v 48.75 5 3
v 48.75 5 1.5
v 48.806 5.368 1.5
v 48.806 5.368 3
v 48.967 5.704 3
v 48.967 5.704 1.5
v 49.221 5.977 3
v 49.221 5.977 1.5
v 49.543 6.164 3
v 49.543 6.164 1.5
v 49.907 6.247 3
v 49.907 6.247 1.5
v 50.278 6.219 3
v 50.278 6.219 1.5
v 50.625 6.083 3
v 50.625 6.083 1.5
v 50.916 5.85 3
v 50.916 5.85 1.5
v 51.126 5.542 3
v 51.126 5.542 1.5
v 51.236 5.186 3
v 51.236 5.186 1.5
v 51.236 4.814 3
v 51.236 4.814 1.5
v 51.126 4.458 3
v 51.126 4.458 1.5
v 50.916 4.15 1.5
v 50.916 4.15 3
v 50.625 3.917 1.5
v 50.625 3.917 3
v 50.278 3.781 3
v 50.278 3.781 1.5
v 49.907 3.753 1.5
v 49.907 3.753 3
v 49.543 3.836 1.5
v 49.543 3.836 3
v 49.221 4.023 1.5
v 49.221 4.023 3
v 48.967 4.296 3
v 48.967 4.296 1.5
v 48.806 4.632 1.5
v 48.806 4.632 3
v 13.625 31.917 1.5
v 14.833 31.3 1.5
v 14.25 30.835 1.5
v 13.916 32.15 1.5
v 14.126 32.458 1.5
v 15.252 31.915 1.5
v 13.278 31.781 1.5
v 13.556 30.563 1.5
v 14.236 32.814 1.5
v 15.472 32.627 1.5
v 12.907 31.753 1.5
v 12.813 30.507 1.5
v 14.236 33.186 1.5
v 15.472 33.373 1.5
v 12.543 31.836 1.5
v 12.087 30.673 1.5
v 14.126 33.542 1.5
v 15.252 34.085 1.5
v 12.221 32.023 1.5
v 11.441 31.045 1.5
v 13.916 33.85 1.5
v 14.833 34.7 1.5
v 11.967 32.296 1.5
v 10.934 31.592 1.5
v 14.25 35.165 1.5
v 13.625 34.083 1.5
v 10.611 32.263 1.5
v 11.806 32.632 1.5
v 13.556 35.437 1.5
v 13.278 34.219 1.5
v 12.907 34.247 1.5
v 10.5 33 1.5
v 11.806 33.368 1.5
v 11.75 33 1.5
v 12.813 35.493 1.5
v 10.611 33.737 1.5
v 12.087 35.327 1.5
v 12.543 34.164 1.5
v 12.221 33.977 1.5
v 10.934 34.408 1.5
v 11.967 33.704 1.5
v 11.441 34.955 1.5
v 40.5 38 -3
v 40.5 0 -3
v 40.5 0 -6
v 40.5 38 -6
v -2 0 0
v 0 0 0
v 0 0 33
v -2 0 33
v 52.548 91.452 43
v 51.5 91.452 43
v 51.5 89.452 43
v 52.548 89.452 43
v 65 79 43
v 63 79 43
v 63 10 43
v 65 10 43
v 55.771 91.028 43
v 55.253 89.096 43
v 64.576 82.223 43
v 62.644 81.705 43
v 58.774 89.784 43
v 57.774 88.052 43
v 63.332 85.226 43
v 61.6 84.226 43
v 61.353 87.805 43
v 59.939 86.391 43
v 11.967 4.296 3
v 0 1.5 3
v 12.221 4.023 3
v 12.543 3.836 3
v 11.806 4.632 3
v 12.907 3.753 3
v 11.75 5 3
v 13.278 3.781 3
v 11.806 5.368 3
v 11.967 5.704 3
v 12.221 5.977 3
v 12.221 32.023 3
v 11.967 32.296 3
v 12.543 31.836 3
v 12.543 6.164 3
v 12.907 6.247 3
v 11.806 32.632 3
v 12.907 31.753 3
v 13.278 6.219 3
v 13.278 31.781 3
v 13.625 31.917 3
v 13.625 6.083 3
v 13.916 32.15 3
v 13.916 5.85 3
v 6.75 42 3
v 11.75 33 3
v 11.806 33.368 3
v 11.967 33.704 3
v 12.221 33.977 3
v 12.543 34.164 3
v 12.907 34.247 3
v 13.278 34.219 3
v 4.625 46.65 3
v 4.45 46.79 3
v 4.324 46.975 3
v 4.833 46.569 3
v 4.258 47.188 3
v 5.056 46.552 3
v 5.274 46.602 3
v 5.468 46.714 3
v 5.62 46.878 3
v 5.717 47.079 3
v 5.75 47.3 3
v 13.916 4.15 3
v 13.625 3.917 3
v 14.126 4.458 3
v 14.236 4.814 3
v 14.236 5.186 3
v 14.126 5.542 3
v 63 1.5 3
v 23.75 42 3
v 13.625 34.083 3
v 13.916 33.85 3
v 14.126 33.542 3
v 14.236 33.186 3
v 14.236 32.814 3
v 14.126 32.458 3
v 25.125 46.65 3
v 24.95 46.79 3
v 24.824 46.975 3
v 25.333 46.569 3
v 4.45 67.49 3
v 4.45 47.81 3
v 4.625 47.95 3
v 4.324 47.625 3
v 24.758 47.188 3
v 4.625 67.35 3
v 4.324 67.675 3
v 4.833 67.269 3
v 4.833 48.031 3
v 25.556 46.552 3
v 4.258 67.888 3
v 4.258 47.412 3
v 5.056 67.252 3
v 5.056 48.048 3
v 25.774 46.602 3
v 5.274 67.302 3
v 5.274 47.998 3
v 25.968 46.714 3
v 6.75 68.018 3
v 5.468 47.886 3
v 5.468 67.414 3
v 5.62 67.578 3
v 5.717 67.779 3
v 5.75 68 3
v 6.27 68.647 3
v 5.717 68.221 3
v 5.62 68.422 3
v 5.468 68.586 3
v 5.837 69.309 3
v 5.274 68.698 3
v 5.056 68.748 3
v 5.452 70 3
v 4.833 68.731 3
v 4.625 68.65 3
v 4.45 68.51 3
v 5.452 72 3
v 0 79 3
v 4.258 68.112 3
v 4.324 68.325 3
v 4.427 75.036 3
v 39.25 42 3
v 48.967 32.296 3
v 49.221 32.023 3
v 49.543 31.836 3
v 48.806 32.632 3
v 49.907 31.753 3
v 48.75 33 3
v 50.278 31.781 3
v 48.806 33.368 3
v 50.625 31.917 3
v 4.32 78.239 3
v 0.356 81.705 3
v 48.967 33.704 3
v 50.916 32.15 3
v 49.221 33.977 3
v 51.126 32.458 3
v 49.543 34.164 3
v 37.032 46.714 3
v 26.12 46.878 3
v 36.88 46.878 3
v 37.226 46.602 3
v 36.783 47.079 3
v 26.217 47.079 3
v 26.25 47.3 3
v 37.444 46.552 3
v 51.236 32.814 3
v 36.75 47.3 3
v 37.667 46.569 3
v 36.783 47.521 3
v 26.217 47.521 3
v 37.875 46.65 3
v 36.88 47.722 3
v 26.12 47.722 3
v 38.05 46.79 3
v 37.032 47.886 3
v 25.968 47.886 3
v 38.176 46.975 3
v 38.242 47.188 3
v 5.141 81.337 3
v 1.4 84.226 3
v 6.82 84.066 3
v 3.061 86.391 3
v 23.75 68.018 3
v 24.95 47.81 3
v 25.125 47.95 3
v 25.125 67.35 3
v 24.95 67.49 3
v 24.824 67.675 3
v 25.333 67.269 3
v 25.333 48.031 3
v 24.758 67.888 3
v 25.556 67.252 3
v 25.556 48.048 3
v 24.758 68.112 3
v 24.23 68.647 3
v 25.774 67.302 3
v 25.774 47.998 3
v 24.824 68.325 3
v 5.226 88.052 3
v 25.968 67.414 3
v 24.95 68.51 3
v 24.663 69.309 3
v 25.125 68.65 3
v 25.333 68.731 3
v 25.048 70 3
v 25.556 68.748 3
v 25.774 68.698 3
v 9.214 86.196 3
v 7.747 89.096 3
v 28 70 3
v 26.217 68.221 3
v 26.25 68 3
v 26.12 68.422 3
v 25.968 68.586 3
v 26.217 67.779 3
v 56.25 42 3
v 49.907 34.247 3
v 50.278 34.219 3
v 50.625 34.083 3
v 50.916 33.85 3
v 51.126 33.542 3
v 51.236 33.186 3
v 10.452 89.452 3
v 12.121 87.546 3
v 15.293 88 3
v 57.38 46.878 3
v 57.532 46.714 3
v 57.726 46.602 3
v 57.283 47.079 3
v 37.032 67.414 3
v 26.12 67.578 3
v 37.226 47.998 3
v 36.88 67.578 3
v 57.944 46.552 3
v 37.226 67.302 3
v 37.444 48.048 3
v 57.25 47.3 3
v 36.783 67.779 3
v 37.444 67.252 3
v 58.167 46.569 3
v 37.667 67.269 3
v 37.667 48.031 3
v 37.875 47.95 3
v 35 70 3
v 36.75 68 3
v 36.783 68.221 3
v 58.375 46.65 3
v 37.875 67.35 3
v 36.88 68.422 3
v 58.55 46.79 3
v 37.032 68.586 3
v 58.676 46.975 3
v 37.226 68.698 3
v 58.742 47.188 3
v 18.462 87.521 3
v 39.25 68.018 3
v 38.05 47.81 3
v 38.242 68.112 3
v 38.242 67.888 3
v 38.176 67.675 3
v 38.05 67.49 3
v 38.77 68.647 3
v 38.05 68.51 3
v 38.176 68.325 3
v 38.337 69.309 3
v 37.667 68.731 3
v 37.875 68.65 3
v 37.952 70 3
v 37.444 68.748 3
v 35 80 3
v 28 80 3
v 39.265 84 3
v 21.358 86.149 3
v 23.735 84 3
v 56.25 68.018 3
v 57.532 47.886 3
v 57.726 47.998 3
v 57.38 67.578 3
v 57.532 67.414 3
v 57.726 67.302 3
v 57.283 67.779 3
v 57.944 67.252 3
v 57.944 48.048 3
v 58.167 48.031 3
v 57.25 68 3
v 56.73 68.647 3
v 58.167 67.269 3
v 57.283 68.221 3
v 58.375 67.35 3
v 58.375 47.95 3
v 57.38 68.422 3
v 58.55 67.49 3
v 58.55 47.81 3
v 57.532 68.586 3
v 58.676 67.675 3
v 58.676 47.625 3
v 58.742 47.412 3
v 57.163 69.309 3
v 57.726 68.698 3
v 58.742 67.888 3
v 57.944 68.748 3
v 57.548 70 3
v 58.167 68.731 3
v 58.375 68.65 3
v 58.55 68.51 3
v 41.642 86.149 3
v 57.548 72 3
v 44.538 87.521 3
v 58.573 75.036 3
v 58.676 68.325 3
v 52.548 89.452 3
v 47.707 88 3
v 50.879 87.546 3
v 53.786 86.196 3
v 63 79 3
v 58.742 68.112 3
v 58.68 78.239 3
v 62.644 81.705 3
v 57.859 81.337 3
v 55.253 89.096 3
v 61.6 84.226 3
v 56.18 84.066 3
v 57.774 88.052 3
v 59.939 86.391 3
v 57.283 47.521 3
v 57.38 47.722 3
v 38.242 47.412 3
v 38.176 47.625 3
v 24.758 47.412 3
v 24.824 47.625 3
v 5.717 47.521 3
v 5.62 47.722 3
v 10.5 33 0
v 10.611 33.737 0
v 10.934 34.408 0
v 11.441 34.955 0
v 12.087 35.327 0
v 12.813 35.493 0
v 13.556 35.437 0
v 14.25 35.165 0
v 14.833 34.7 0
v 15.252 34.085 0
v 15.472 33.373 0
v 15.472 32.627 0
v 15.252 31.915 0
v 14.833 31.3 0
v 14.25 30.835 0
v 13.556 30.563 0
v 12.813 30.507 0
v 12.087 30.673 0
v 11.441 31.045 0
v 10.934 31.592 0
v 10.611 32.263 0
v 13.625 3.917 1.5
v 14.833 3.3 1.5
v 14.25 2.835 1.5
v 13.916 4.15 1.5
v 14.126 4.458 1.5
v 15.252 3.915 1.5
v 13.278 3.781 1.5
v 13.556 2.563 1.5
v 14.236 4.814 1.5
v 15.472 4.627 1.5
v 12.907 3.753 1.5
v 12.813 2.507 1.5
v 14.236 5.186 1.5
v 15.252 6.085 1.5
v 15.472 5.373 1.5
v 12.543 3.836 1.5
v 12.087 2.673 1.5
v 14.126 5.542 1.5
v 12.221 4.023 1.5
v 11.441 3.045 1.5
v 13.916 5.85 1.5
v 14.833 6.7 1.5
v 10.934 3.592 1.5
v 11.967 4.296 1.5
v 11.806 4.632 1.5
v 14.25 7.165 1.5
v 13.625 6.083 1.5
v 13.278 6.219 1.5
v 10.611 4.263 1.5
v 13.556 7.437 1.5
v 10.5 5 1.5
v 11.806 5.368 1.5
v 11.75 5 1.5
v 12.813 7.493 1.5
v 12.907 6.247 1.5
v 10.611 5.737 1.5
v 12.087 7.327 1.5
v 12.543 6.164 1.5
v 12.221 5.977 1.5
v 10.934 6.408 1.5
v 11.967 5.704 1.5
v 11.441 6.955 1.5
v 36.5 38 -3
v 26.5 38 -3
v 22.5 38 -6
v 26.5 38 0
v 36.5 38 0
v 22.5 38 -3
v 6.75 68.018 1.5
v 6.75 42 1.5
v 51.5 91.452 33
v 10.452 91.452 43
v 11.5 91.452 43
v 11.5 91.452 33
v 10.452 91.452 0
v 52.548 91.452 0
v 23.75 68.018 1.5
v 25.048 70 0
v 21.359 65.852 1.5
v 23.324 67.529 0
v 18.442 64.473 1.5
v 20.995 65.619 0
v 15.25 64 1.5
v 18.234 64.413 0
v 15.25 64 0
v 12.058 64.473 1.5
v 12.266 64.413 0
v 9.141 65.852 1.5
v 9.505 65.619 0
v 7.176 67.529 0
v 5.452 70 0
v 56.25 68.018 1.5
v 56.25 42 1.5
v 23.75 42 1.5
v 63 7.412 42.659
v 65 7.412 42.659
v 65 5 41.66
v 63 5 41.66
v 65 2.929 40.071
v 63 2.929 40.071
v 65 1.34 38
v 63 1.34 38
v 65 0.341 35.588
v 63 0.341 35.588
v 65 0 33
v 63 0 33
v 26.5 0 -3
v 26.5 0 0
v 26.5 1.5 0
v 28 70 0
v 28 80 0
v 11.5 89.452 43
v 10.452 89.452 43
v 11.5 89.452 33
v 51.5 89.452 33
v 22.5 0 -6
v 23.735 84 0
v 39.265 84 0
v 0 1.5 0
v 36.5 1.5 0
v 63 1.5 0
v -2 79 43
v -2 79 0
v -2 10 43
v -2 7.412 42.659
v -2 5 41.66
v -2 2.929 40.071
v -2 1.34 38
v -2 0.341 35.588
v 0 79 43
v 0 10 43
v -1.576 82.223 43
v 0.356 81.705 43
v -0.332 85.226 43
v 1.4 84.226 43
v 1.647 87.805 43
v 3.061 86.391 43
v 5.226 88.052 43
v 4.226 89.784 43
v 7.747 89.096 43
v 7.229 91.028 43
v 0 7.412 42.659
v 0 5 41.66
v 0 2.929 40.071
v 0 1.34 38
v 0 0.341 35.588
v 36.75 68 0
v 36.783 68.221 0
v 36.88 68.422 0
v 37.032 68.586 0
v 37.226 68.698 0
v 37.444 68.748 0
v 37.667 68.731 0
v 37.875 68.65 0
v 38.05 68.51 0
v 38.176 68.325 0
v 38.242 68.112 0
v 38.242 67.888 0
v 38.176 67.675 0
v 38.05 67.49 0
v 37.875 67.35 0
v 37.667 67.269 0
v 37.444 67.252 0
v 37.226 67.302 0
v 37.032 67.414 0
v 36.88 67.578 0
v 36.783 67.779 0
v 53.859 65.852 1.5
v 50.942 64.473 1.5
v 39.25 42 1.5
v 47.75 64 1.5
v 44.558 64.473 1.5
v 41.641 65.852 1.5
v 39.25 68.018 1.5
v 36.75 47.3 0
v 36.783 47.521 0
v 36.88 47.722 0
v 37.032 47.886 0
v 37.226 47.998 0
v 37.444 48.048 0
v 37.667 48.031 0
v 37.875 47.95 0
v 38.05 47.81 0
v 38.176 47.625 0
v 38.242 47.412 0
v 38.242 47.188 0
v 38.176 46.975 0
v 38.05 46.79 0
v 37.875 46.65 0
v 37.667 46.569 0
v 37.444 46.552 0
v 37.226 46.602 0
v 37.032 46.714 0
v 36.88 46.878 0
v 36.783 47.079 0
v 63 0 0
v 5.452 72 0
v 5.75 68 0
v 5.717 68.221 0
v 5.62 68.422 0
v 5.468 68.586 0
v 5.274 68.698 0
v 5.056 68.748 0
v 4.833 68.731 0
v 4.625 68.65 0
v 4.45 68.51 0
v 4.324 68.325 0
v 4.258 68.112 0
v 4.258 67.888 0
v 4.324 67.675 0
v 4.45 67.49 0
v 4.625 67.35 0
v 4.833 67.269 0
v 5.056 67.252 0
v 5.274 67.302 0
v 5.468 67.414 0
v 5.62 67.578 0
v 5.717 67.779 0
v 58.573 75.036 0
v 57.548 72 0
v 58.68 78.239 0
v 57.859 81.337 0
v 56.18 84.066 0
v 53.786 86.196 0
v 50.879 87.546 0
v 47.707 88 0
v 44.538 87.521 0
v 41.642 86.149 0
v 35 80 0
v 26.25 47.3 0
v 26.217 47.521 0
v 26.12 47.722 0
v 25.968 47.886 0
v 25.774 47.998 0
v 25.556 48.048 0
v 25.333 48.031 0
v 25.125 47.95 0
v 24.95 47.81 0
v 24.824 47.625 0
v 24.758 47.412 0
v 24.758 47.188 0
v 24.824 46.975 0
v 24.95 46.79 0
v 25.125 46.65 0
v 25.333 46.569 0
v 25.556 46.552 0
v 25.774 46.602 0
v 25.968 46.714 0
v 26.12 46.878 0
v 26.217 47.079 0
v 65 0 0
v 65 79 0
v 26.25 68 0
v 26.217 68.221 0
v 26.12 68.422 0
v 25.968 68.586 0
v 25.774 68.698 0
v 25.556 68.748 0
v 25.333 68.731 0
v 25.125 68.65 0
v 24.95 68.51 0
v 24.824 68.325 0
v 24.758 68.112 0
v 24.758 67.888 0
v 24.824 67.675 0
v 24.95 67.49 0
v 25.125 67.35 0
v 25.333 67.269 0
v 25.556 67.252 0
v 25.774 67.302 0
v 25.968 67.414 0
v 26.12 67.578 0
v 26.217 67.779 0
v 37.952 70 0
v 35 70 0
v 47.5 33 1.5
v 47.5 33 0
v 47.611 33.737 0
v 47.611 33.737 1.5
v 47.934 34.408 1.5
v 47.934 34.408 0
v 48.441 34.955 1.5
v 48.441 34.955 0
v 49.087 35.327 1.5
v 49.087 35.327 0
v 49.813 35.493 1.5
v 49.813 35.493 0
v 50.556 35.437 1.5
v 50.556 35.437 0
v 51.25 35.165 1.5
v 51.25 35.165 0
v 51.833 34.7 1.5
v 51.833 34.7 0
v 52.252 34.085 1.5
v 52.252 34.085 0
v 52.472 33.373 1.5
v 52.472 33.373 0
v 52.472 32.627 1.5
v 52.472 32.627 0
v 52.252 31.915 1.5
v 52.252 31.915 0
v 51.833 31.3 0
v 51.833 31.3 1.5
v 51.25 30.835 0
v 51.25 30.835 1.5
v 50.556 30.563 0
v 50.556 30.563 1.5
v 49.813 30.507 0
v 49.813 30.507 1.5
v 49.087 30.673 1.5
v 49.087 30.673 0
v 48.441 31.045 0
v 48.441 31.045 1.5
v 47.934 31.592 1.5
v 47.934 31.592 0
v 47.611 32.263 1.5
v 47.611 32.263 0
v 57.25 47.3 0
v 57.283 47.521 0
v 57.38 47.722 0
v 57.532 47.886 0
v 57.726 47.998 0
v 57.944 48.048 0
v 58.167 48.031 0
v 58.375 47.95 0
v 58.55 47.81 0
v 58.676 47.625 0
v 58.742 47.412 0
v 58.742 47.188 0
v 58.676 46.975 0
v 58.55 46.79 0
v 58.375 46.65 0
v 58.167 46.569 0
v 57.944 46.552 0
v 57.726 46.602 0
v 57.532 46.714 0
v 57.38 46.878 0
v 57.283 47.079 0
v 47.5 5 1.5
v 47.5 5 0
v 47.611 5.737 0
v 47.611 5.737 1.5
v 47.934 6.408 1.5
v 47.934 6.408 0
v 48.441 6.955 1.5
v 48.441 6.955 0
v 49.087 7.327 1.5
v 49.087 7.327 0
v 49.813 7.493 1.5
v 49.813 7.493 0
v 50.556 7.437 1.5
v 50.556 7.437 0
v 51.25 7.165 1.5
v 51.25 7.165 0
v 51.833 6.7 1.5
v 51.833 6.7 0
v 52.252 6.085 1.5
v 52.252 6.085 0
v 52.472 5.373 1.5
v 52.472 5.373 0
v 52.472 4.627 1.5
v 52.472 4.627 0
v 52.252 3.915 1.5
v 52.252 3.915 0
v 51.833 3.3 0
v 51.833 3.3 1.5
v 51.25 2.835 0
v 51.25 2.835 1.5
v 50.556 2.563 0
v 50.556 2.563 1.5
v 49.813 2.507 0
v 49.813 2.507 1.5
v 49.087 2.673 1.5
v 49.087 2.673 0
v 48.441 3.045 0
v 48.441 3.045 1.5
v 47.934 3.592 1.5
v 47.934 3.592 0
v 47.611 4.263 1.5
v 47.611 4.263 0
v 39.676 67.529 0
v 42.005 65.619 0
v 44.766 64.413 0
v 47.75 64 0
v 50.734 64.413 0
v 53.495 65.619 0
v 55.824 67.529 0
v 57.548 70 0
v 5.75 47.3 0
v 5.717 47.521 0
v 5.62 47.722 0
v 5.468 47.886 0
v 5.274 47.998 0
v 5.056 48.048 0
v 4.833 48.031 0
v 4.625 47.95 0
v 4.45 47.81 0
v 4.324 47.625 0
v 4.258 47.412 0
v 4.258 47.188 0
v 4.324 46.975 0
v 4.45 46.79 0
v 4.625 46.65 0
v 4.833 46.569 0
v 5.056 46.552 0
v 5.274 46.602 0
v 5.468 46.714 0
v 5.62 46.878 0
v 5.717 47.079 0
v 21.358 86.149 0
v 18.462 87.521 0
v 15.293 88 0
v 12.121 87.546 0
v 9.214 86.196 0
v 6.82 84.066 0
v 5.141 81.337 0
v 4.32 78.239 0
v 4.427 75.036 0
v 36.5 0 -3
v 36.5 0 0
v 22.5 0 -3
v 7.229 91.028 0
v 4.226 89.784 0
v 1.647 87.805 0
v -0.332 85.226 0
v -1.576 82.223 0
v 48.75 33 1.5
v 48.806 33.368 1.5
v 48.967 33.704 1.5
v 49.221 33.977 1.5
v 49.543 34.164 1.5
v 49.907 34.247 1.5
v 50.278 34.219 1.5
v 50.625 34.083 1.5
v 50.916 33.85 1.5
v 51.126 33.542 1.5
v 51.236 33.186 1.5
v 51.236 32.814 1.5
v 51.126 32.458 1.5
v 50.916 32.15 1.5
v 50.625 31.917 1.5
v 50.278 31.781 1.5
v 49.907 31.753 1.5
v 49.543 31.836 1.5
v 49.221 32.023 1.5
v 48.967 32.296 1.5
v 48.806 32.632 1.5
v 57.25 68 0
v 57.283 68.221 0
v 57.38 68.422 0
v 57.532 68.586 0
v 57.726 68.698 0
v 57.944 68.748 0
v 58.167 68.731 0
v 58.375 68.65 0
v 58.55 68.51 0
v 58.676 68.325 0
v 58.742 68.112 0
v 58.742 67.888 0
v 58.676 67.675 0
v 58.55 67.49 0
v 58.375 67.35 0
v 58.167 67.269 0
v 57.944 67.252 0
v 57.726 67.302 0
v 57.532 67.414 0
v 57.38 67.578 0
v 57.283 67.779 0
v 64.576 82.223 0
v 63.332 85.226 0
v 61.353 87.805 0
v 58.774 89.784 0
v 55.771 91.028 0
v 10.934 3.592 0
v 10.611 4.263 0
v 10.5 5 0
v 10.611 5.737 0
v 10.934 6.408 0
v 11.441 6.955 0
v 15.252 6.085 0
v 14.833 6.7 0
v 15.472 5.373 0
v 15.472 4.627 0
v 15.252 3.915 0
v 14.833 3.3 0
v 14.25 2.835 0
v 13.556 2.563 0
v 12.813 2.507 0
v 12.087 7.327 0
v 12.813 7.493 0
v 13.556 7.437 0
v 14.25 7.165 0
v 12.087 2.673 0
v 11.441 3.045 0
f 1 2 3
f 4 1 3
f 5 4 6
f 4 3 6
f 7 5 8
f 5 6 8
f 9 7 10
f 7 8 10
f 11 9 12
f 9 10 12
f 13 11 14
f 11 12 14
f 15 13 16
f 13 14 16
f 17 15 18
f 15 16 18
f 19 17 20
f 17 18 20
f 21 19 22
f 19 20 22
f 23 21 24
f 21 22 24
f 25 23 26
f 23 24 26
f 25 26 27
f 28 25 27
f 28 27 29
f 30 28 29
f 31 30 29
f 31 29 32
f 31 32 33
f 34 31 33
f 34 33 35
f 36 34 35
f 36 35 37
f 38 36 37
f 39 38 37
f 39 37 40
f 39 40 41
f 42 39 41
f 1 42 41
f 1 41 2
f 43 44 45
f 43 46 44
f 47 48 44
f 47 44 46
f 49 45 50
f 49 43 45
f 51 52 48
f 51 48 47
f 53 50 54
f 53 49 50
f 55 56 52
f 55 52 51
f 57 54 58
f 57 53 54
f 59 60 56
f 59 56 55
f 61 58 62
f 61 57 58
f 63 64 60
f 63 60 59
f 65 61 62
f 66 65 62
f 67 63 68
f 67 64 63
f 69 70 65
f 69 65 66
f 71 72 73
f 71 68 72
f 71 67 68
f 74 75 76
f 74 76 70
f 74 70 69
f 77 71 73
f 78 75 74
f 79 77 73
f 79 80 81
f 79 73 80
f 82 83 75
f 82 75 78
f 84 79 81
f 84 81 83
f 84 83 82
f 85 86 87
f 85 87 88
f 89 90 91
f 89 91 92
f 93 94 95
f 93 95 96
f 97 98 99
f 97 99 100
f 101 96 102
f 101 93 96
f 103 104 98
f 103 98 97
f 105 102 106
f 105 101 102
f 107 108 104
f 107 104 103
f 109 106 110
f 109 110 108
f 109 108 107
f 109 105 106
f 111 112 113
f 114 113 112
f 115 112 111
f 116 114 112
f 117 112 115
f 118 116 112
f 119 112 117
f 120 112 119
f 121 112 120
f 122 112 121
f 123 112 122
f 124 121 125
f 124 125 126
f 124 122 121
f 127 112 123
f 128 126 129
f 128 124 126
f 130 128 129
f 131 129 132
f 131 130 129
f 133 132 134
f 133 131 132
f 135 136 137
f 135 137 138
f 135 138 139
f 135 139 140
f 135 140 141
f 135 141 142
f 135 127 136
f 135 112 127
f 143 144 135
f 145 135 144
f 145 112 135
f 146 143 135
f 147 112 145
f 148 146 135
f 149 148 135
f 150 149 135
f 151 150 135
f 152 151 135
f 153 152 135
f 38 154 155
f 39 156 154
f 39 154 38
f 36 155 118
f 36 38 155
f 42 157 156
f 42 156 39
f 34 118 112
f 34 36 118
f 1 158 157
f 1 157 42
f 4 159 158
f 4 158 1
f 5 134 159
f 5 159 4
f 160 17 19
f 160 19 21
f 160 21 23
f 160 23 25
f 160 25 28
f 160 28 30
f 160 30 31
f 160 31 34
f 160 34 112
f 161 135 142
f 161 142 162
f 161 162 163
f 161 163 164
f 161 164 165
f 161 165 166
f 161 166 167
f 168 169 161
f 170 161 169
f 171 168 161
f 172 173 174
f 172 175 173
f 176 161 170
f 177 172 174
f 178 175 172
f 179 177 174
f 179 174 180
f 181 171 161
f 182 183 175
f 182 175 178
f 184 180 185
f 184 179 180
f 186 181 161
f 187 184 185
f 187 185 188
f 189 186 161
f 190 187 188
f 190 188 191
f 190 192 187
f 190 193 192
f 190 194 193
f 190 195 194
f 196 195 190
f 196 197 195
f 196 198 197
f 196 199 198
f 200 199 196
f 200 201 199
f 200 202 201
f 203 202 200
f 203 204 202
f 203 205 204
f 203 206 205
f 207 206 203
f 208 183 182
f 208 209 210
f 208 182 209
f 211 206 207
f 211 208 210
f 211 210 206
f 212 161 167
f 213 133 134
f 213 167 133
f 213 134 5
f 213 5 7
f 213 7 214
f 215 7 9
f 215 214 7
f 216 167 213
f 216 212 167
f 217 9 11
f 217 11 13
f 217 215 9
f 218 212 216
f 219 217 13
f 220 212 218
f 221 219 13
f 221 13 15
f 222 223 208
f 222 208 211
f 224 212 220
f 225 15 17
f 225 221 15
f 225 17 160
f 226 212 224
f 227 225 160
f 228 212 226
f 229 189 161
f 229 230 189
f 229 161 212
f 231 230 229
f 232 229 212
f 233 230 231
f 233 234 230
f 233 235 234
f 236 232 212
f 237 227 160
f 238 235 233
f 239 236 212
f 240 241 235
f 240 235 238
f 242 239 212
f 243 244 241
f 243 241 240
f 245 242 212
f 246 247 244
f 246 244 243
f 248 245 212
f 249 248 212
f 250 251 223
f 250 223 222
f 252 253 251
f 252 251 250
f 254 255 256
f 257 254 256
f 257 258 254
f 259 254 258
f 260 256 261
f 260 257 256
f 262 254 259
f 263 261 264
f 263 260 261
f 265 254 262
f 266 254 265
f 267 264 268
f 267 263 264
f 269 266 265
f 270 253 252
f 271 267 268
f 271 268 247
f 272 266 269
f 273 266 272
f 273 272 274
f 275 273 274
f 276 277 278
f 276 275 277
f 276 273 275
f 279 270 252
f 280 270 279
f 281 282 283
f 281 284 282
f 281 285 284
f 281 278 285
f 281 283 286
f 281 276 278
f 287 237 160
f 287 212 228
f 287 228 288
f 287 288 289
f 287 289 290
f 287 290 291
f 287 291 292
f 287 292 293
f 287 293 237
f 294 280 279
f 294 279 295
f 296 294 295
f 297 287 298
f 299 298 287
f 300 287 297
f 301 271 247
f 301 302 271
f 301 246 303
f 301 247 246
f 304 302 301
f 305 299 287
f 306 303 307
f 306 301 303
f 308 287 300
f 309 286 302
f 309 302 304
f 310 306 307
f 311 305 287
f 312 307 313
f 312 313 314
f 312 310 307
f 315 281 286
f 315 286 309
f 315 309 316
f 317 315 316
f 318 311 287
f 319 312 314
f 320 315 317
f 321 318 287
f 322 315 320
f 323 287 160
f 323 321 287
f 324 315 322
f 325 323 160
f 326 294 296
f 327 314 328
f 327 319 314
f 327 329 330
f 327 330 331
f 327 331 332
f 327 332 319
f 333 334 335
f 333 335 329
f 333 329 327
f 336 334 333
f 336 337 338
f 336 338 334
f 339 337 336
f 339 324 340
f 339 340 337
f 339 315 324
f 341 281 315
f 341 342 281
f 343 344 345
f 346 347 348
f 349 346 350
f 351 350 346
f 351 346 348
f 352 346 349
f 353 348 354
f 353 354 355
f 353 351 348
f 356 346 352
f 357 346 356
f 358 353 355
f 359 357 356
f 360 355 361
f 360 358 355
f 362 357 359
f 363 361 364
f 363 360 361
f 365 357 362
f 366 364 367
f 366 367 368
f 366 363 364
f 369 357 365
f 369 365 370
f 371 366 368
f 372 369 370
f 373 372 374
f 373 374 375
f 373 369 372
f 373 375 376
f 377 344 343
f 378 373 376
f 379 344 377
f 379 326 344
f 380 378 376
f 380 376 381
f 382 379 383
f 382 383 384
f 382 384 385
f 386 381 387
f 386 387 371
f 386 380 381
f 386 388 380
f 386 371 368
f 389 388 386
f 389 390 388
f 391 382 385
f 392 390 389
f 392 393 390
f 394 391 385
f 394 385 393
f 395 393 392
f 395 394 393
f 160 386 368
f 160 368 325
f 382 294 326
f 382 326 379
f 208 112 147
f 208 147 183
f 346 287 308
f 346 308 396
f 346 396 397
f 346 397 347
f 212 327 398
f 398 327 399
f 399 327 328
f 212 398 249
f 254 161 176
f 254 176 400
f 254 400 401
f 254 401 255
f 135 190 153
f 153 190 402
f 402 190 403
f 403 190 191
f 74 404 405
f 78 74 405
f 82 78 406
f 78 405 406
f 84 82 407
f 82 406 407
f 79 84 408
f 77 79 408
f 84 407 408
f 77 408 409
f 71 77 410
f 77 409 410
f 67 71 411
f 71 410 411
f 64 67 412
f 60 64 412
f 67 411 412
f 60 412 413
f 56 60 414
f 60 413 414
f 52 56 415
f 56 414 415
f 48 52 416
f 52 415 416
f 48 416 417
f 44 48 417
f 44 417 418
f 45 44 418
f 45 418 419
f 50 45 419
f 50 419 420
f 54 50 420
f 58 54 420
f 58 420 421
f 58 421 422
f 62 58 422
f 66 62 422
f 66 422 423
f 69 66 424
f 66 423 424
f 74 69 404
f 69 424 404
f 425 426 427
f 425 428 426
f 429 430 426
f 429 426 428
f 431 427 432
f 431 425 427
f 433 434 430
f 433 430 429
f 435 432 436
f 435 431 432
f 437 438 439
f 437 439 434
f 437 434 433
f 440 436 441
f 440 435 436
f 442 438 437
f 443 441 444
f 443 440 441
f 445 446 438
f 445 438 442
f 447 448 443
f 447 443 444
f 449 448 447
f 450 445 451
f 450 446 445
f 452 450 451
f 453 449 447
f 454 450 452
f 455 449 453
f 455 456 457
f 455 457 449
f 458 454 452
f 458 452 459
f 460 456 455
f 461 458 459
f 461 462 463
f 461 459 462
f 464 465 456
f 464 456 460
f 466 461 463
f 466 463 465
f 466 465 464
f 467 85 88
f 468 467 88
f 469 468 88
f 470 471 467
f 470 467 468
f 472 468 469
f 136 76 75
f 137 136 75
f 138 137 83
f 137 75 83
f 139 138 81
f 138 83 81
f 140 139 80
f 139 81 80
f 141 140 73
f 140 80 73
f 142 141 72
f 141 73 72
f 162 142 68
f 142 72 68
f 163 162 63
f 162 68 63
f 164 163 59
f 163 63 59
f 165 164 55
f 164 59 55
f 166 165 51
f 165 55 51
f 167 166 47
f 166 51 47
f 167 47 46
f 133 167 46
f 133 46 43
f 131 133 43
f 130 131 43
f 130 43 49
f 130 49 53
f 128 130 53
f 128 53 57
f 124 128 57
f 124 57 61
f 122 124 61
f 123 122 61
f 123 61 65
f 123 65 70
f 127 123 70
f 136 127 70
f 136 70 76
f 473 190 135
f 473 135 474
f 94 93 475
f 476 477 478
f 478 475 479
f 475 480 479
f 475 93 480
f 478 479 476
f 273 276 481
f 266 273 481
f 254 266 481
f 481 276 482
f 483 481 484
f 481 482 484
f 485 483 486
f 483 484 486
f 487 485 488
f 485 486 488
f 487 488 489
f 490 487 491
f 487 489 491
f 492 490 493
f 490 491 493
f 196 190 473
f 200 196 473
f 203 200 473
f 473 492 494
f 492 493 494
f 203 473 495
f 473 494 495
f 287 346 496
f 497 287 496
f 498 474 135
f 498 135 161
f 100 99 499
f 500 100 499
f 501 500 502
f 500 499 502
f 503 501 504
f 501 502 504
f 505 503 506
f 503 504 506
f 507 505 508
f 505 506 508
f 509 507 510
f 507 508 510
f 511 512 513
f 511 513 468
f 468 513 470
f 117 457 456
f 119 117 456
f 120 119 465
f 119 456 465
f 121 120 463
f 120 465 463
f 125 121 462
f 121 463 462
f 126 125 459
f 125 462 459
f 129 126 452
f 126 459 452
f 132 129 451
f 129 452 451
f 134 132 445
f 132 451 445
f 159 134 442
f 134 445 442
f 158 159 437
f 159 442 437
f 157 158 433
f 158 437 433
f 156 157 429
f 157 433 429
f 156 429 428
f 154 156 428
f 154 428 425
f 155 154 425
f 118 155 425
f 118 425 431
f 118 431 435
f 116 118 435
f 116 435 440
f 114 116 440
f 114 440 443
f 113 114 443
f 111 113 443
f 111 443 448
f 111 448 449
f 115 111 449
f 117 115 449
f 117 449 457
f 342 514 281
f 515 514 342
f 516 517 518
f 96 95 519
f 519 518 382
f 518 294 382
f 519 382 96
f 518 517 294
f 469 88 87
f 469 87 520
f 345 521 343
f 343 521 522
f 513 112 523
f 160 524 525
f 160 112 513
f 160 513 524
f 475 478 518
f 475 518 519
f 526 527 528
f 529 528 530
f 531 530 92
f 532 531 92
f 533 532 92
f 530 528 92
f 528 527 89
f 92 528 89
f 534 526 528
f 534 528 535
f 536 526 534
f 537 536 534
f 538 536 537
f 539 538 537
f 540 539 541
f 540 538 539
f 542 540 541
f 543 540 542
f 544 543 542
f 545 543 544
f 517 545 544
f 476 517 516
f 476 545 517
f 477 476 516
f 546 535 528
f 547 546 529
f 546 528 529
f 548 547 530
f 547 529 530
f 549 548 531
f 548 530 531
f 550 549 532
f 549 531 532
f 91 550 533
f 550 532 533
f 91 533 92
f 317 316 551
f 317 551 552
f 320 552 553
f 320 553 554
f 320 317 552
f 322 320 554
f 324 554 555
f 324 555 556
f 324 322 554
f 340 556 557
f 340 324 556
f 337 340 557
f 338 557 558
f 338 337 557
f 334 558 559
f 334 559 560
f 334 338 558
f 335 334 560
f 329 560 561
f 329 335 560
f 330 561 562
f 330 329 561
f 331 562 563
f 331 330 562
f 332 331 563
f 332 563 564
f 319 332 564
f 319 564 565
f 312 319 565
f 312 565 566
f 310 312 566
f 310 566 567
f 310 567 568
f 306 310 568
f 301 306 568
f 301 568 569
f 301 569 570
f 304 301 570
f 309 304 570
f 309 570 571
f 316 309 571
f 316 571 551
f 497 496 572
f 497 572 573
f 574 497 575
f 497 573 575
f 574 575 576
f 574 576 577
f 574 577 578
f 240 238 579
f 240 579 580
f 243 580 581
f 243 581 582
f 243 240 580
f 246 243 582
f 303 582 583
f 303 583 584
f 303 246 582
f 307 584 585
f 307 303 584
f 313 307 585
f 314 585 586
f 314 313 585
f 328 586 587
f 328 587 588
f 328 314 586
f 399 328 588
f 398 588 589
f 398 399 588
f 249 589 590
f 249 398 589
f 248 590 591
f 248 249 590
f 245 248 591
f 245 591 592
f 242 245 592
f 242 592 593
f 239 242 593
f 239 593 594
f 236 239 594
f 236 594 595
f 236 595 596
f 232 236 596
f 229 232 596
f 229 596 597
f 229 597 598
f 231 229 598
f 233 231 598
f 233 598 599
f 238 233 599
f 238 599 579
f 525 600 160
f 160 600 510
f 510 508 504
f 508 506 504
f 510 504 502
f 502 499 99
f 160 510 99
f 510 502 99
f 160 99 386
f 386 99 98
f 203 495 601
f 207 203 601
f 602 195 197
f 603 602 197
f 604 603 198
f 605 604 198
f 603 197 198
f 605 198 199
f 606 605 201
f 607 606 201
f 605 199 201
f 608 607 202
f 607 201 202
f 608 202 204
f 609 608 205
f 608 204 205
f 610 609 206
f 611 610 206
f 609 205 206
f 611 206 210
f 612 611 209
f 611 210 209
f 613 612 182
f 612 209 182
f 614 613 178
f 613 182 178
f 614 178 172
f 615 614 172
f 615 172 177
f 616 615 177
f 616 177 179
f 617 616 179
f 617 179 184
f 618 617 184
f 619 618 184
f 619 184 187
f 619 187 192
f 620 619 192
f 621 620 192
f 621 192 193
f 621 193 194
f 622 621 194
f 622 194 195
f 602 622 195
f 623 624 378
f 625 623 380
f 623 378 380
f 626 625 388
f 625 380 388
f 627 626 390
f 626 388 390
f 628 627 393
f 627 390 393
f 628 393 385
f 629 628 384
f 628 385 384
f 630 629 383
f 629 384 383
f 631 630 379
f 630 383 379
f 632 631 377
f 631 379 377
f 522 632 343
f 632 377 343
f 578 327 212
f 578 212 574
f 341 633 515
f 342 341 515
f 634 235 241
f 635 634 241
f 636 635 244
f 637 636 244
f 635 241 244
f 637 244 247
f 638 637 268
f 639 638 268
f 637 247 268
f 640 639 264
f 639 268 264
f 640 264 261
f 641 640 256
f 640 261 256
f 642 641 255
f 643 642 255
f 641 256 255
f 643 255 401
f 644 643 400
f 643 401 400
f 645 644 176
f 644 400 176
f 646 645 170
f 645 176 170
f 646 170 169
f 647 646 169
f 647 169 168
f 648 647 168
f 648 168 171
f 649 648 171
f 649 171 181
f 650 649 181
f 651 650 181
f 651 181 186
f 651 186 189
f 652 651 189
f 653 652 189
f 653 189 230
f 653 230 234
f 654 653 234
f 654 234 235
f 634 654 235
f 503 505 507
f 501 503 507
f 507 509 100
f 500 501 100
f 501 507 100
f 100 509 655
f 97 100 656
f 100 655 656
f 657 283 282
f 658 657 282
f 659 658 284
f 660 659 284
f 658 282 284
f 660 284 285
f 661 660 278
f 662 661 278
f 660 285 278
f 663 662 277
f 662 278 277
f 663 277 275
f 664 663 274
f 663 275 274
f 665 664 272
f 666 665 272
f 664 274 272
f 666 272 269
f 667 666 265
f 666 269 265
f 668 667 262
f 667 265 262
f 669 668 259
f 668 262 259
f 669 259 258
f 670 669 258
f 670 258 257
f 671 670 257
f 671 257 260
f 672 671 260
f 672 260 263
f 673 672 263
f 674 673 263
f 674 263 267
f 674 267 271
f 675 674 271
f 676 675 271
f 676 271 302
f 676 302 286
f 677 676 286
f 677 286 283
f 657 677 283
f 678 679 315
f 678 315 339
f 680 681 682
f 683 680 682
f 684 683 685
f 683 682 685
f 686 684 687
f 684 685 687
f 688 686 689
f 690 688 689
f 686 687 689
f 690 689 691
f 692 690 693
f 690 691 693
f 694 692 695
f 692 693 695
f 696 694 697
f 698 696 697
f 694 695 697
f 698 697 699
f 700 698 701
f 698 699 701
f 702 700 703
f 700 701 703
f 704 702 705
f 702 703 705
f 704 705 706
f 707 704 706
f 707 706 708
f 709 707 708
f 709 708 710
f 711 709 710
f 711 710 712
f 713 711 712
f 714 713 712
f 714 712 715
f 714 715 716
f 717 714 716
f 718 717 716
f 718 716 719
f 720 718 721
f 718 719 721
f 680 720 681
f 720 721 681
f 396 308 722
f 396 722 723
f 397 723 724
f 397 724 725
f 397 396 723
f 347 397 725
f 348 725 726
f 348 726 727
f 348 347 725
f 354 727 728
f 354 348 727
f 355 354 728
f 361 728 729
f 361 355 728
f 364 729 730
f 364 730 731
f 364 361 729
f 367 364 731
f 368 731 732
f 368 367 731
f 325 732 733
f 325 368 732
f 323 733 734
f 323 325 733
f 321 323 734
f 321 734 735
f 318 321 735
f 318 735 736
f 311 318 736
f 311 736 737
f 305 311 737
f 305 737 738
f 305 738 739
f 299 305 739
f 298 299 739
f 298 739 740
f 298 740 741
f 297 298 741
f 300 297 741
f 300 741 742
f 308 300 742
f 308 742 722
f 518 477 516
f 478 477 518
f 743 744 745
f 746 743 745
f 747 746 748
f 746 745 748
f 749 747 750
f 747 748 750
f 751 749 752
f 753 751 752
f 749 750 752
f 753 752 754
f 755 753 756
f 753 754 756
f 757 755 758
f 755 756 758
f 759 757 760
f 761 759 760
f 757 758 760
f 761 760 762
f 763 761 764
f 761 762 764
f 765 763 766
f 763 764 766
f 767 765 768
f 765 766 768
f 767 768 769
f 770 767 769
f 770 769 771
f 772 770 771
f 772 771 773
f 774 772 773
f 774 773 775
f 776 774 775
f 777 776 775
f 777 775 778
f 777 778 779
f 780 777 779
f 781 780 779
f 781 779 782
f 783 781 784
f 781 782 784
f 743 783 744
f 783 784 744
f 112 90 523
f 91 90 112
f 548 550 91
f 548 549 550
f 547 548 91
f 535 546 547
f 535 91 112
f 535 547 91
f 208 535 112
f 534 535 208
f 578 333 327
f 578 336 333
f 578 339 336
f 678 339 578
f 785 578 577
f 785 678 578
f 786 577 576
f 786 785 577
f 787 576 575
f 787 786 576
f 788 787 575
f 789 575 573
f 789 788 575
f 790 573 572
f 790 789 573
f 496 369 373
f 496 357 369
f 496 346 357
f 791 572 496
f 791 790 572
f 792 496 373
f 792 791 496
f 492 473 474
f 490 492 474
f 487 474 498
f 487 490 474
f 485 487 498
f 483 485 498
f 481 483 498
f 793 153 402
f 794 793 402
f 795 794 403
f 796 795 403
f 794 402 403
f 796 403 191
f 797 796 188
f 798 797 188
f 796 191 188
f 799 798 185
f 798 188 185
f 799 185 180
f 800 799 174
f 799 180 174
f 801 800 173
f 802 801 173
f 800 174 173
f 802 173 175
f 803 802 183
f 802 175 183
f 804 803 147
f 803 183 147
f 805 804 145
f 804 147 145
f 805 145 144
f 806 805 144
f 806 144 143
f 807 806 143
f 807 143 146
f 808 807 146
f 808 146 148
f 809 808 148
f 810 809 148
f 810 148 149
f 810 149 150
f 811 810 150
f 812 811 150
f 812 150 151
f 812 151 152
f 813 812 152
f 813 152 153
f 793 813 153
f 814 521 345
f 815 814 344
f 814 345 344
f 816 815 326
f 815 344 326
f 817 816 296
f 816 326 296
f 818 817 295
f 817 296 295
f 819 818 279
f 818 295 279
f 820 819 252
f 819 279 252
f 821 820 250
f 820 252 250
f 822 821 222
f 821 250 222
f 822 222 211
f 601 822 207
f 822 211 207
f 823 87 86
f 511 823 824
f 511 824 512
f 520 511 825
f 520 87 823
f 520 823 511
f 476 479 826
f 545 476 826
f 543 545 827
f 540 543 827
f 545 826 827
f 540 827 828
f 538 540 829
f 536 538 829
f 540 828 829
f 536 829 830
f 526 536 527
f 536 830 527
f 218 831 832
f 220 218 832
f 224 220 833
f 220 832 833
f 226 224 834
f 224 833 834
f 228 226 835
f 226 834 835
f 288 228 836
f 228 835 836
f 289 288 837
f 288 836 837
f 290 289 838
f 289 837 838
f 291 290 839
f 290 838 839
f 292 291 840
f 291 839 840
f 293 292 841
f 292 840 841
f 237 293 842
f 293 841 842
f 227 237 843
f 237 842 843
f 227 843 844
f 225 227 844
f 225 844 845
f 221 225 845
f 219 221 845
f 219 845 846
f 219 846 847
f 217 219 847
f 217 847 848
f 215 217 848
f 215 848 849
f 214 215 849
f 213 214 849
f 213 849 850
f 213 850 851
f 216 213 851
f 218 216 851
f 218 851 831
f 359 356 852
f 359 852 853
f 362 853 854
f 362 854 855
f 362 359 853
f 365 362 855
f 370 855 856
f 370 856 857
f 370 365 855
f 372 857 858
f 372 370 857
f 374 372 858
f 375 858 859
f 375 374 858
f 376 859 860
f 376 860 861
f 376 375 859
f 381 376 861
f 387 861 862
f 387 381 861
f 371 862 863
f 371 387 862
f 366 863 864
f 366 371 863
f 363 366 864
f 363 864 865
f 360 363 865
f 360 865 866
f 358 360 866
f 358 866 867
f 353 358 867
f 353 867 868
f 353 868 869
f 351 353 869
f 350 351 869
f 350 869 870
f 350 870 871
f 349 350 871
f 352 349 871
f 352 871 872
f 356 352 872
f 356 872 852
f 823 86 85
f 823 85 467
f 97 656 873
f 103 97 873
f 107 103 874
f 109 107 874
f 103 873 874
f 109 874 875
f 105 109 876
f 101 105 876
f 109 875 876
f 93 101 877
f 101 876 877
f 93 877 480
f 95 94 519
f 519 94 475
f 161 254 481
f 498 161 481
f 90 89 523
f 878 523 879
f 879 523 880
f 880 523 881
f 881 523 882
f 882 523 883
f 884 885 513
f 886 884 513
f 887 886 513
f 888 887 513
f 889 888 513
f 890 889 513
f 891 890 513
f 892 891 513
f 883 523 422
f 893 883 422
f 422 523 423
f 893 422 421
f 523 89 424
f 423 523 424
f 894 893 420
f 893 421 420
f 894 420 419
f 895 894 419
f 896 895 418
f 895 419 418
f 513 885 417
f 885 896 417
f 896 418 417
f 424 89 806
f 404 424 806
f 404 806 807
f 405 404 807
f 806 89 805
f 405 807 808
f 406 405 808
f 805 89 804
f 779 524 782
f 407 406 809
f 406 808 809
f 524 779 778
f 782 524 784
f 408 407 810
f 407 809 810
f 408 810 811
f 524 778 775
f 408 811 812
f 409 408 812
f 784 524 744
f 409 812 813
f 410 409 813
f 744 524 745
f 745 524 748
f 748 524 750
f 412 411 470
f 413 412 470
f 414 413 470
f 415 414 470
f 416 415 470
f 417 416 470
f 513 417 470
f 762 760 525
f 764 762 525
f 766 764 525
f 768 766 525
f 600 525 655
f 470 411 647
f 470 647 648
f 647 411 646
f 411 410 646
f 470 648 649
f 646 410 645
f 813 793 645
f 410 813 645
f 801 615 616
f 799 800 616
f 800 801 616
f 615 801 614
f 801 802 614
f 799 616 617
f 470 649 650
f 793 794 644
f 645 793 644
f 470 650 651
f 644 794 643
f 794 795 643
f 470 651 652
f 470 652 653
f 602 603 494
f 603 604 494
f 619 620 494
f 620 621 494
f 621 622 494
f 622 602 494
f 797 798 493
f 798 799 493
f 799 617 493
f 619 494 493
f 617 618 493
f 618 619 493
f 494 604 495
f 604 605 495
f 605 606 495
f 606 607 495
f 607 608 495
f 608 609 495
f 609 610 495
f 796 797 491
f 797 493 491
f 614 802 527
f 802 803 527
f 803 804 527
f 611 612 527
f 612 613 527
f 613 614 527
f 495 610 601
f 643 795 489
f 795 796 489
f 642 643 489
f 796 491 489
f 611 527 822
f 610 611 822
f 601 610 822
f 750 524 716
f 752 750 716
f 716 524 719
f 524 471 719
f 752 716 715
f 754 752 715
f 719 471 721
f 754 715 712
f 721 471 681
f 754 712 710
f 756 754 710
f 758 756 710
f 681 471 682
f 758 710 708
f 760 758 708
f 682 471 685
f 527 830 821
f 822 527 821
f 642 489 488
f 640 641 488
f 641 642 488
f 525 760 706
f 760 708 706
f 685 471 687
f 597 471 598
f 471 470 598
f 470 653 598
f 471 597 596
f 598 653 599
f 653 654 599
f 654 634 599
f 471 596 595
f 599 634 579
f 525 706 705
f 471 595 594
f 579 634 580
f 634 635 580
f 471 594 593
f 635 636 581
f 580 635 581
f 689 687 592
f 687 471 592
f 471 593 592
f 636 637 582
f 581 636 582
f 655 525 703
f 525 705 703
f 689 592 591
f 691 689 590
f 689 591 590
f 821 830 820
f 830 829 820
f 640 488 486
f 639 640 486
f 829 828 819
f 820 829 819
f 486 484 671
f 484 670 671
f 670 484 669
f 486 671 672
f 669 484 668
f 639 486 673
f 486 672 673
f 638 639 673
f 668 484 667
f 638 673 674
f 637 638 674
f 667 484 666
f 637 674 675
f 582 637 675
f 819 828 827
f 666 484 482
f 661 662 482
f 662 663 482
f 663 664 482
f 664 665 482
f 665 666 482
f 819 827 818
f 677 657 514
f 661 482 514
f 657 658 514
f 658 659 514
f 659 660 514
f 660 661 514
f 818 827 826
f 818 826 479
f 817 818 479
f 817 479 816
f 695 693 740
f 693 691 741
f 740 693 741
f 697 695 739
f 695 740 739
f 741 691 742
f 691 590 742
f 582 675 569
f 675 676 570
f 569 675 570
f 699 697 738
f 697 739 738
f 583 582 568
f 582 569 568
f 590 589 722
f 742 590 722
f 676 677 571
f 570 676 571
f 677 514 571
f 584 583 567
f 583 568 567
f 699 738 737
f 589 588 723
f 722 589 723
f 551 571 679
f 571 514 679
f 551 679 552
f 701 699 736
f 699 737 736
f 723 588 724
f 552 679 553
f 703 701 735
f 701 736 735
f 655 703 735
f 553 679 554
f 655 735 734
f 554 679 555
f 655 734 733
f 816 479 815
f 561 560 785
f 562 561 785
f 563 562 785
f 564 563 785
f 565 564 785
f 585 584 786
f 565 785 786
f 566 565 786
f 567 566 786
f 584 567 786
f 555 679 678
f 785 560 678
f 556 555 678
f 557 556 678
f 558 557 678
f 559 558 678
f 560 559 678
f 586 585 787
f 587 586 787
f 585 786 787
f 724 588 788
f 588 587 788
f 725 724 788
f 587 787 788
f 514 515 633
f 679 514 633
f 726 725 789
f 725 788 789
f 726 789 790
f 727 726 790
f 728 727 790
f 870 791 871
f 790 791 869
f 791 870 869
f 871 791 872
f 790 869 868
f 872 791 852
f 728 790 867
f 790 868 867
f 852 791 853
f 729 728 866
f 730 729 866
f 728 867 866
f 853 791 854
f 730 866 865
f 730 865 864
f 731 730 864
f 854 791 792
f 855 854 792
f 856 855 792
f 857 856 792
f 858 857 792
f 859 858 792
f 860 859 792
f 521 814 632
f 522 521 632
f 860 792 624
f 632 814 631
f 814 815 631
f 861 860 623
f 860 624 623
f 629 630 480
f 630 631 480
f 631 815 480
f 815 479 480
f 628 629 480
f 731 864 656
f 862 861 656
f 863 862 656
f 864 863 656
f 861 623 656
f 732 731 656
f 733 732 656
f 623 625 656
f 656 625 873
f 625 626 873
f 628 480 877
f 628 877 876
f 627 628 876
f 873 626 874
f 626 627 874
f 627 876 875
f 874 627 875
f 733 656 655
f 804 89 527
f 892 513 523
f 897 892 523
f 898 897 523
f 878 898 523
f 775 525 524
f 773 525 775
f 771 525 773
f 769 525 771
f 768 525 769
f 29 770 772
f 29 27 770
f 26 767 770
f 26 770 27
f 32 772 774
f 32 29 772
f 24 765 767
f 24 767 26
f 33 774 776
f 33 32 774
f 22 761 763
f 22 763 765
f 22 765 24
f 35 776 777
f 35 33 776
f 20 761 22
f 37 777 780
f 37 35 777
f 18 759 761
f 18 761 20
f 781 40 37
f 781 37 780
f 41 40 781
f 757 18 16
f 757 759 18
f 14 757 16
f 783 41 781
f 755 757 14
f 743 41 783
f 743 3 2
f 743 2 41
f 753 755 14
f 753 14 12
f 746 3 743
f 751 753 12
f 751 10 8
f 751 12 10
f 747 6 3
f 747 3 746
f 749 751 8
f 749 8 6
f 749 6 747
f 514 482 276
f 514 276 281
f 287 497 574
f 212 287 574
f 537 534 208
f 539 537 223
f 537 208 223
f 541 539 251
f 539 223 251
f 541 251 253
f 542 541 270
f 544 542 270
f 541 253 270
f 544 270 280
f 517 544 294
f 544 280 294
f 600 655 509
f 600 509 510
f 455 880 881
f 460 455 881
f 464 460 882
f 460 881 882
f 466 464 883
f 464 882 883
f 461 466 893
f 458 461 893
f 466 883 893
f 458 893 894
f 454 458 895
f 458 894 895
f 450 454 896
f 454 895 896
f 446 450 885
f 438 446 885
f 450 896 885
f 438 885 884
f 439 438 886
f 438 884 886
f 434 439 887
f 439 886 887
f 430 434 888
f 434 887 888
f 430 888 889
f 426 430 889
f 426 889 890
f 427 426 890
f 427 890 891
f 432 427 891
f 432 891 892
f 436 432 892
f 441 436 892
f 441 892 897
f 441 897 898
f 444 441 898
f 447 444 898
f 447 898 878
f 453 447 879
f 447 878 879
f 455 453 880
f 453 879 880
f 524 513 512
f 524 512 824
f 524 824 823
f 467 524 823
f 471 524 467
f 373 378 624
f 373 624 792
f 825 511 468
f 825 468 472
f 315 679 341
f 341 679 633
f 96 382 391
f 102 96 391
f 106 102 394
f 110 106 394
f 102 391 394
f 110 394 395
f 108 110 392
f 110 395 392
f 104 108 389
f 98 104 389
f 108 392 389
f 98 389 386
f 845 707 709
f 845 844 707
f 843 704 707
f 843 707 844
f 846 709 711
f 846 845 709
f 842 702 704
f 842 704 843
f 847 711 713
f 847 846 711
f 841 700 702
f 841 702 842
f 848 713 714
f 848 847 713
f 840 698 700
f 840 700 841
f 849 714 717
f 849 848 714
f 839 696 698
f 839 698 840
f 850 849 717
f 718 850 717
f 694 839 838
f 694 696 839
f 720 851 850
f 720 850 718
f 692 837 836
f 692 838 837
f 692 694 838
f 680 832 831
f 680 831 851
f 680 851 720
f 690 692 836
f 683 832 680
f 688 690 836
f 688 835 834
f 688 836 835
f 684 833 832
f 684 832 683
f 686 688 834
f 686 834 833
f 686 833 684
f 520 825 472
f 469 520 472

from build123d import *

# Parameters (mm, degrees)
SKETCH_1_W           = 63
SKETCH_1_H           = 70
EXTRUDE_1_DEPTH      = 3
CUT_EXTRUDE_1_REACH  = 96.223
SKETCH_2_R           = 0.75
SKETCH_3_W           = 17
SKETCH_3_H           = 1.5
CUT_EXTRUDE_2_DEPTH  = 28
SKETCH_4_R           = 11
CUT_EXTRUDE_3_DEPTH  = 95.223139409
CUT_EXTRUDE_5_REACH  = 96.223
SKETCH_6_R           = 1.25
SKETCH_7_R           = 2.5
CUT_EXTRUDE_6_DEPTH  = 1.5
SKETCH_9_W           = 7
SKETCH_9_H           = 10
EXTRUDE_2_DEPTH      = 3
SKETCH_10_W          = 10
SKETCH_10_H          = 38
EXTRUDE_3_DEPTH      = 3
SKETCH_11_W          = 18
SKETCH_11_H          = 38
EXTRUDE_4_DEPTH      = 3
SKETCH_12_W          = 2
SKETCH_12_H          = 70
EXTRUDE_5_DEPTH      = 43
SWEEP_1_DEPTH        = 43
SWEEP_1_2_DEPTH      = 3
CUT_EXTRUDE_7_DEPTH  = 122.249642508
SKETCH_16_R          = 11
CUT_EXTRUDE_9_DEPTH  = 120.11538863
SKETCH_21_W          = 63
SKETCH_21_H          = 1.5
CUT_EXTRUDE_10_DEPTH = 3
CUT_EXTRUDE_11_REACH = 122.156
SKETCH_23_W          = 40
SKETCH_23_H          = 10


# Read off the part's stored shape, not the designer's step: 扫描1
with BuildPart() as part:
    # 草图1 → 凸台-拉伸1 (new body)
    with BuildSketch(Plane.XY):
        with Locations((31.5, 35)):
            Rectangle(SKETCH_1_W, SKETCH_1_H)
    extrude(amount=EXTRUDE_1_DEPTH)

    # 草图2 → 切除-拉伸1 (cut, up to next)
    with BuildSketch(Plane.XY.offset(3), mode=Mode.PRIVATE) as cut_extrude_1_sk1:
        with Locations((5, 68)):
            Circle(SKETCH_2_R)
    cut_extrude_1_tool1 = extrude(cut_extrude_1_sk1.sketch, amount=-CUT_EXTRUDE_1_REACH, mode=Mode.PRIVATE) & part.part
    # 草图2 → 切除-拉伸1 (cut, up to next)
    with BuildSketch(Plane.XY.offset(3), mode=Mode.PRIVATE) as cut_extrude_1_sk2:
        with Locations((5, 47.3)):
            Circle(SKETCH_2_R)
    cut_extrude_1_tool2 = extrude(cut_extrude_1_sk2.sketch, amount=-CUT_EXTRUDE_1_REACH, mode=Mode.PRIVATE) & part.part
    # 草图2 → 切除-拉伸1 (cut, up to next)
    with BuildSketch(Plane.XY.offset(3), mode=Mode.PRIVATE) as cut_extrude_1_sk3:
        with Locations((25.5, 47.3)):
            Circle(SKETCH_2_R)
    cut_extrude_1_tool3 = extrude(cut_extrude_1_sk3.sketch, amount=-CUT_EXTRUDE_1_REACH, mode=Mode.PRIVATE) & part.part
    # 草图2 → 切除-拉伸1 (cut, up to next)
    with BuildSketch(Plane.XY.offset(3), mode=Mode.PRIVATE) as cut_extrude_1_sk4:
        with Locations((25.5, 68)):
            Circle(SKETCH_2_R)
    cut_extrude_1_tool4 = extrude(cut_extrude_1_sk4.sketch, amount=-CUT_EXTRUDE_1_REACH, mode=Mode.PRIVATE) & part.part
    cut_extrude_1_1 = cut_extrude_1_tool1.solids().sort_by_distance((5, 68, 3))[0]
    add(cut_extrude_1_1, mode=Mode.SUBTRACT)
    cut_extrude_1_2 = cut_extrude_1_tool2.solids().sort_by_distance((5, 47.3, 3))[0]
    add(cut_extrude_1_2, mode=Mode.SUBTRACT)
    cut_extrude_1_3 = cut_extrude_1_tool3.solids().sort_by_distance((25.5, 47.3, 3))[0]
    add(cut_extrude_1_3, mode=Mode.SUBTRACT)
    cut_extrude_1_4 = cut_extrude_1_tool4.solids().sort_by_distance((25.5, 68, 3))[0]
    add(cut_extrude_1_4, mode=Mode.SUBTRACT)
    cut_extrude_1 = cut_extrude_1_1 + cut_extrude_1_2 + cut_extrude_1_3 + cut_extrude_1_4  # 切除-拉伸1 as one shape, for the pattern or mirror that repeats it

    # 草图3 → 切除-拉伸2 (cut)
    with BuildSketch(Plane(origin=(0, 70, 0), x_dir=(1, 0, 0), z_dir=(0, 1, 0))):
        with Locations((15.25, -2.25)):
            Rectangle(SKETCH_3_W, SKETCH_3_H)
    cut_extrude_2 = extrude(amount=-CUT_EXTRUDE_2_DEPTH, mode=Mode.SUBTRACT)

    # 草图4 → 切除-拉伸3 (cut, through all)
    with BuildSketch(Plane(origin=(0, 0, 0), x_dir=(-1, 0, 0), z_dir=(0, 0, -1))):
        with Locations((-15.25, 75)):
            Circle(SKETCH_4_R)
    cut_extrude_3 = extrude(amount=-CUT_EXTRUDE_3_DEPTH, mode=Mode.SUBTRACT)

    # 镜向1: 切除-拉伸1, 切除-拉伸2, 切除-拉伸3 across plane
    add(cut_extrude_1.mirror(Plane.ZY.offset(-31.5)), mode=Mode.SUBTRACT)
    add(cut_extrude_2.mirror(Plane.ZY.offset(-31.5)), mode=Mode.SUBTRACT)
    add(cut_extrude_3.mirror(Plane.ZY.offset(-31.5)), mode=Mode.SUBTRACT)

    # 草图6 → 切除-拉伸5 (cut, up to next)
    with BuildSketch(Plane(origin=(0, 0, 0), x_dir=(-1, 0, 0), z_dir=(0, 0, -1)), mode=Mode.PRIVATE) as cut_extrude_5_sk1:
        with Locations((-50, 5)):
            Circle(SKETCH_6_R)
    cut_extrude_5_tool1 = extrude(cut_extrude_5_sk1.sketch, amount=-CUT_EXTRUDE_5_REACH, mode=Mode.PRIVATE) & part.part
    # 草图6 → 切除-拉伸5 (cut, up to next)
    with BuildSketch(Plane(origin=(0, 0, 0), x_dir=(-1, 0, 0), z_dir=(0, 0, -1)), mode=Mode.PRIVATE) as cut_extrude_5_sk2:
        with Locations((-50, 33)):
            Circle(SKETCH_6_R)
    cut_extrude_5_tool2 = extrude(cut_extrude_5_sk2.sketch, amount=-CUT_EXTRUDE_5_REACH, mode=Mode.PRIVATE) & part.part
    # 草图6 → 切除-拉伸5 (cut, up to next)
    with BuildSketch(Plane(origin=(0, 0, 0), x_dir=(-1, 0, 0), z_dir=(0, 0, -1)), mode=Mode.PRIVATE) as cut_extrude_5_sk3:
        with Locations((-13, 33)):
            Circle(SKETCH_6_R)
    cut_extrude_5_tool3 = extrude(cut_extrude_5_sk3.sketch, amount=-CUT_EXTRUDE_5_REACH, mode=Mode.PRIVATE) & part.part
    # 草图6 → 切除-拉伸5 (cut, up to next)
    with BuildSketch(Plane(origin=(0, 0, 0), x_dir=(-1, 0, 0), z_dir=(0, 0, -1)), mode=Mode.PRIVATE) as cut_extrude_5_sk4:
        with Locations((-13, 5)):
            Circle(SKETCH_6_R)
    cut_extrude_5_tool4 = extrude(cut_extrude_5_sk4.sketch, amount=-CUT_EXTRUDE_5_REACH, mode=Mode.PRIVATE) & part.part
    add(cut_extrude_5_tool1.solids().sort_by_distance((50, 5, 0))[0], mode=Mode.SUBTRACT)
    add(cut_extrude_5_tool2.solids().sort_by_distance((50, 33, 0))[0], mode=Mode.SUBTRACT)
    add(cut_extrude_5_tool3.solids().sort_by_distance((13, 33, 0))[0], mode=Mode.SUBTRACT)
    add(cut_extrude_5_tool4.solids().sort_by_distance((13, 5, 0))[0], mode=Mode.SUBTRACT)

    # 草图7 → 切除-拉伸6 (cut)
    with BuildSketch(Plane(origin=(0, 0, 0), x_dir=(-1, 0, 0), z_dir=(0, 0, -1))):
        with Locations((-50, 33)):
            Circle(SKETCH_7_R)
        with Locations((-13, 33)):
            Circle(SKETCH_7_R)
        with Locations((-13, 5)):
            Circle(SKETCH_7_R)
        with Locations((-50, 5)):
            Circle(SKETCH_7_R)
    extrude(amount=-CUT_EXTRUDE_6_DEPTH, mode=Mode.SUBTRACT)

    # 草图9 → 凸台-拉伸2 (add)
    with BuildSketch(Plane(origin=(0, 0, 0), x_dir=(-1, 0, 0), z_dir=(0, 0, -1))):
        with Locations((-31.5, 75)):
            Rectangle(SKETCH_9_W, SKETCH_9_H)
    extrude(amount=-EXTRUDE_2_DEPTH)

    # 草图10 → 凸台-拉伸3 (add)
    with BuildSketch(Plane(origin=(0, 0, 0), x_dir=(-1, 0, 0), z_dir=(0, 0, -1))):
        with Locations((-31.5, 19)):
            Rectangle(SKETCH_10_W, SKETCH_10_H)
    extrude(amount=EXTRUDE_3_DEPTH)

    # 草图11 → 凸台-拉伸4 (add)
    with BuildSketch(Plane(origin=(0, 0, -3), x_dir=(-1, 0, 0), z_dir=(0, 0, -1))):
        with Locations((-31.5, 19)):
            Rectangle(SKETCH_11_W, SKETCH_11_H)
    extrude(amount=EXTRUDE_4_DEPTH)

    # 草图12 → 凸台-拉伸5 (add)
    with BuildSketch(Plane(origin=(0, 0, 0), x_dir=(-1, 0, 0), z_dir=(0, 0, -1))):
        with Locations((-64, 35)):
            Rectangle(SKETCH_12_W, SKETCH_12_H)
        with Locations((1, 35)):
            Rectangle(SKETCH_12_W, SKETCH_12_H)
    extrude(amount=-EXTRUDE_5_DEPTH)

    # 扫描1 outline → 扫描1 (add)
    with BuildSketch(Plane.XY):
        with BuildLine():
            ThreePointArc((52.547958971, 89.452041029), (59.93866806, 86.390709089), (63, 79))
            Line((63, 79), (63, 70))
            Line((63, 70), (65, 70))
            Line((65, 70), (65, 79))
            ThreePointArc((65, 79), (61.352881622, 87.804922651), (52.547958971, 91.452041029))
            Line((52.547958971, 91.452041029), (10.452041029, 91.452041029))
            ThreePointArc((10.452041029, 91.452041029), (1.647118378, 87.804922651), (-2, 79))
            Line((-2, 79), (-2, 70))
            Line((-2, 70), (0, 70))
            Line((0, 70), (0, 79))
            ThreePointArc((0, 79), (3.06133194, 86.390709089), (10.452041029, 89.452041029))
            Line((10.452041029, 89.452041029), (52.547958971, 89.452041029))
        make_face()
    extrude(amount=SWEEP_1_DEPTH)

    # Sweep 1 2 outline → Sweep 1 2 (add)
    with BuildSketch(Plane.XY):
        with BuildLine():
            Line((63, 70), (63, 79))
            ThreePointArc((63, 79), (59.93866806, 86.390709089), (52.547958971, 89.452041029))
            Line((52.547958971, 89.452041029), (10.452041029, 89.452041029))
            ThreePointArc((10.452041029, 89.452041029), (3.06133194, 86.390709089), (0, 79))
            Line((0, 79), (0, 70))
            Line((0, 70), (5.452041029, 70))
            Line((5.452041029, 70), (5.452041029, 79))
            ThreePointArc((5.452041029, 79), (6.916507123, 82.535533906), (10.452041029, 84))
            Line((10.452041029, 84), (52.547958971, 84))
            ThreePointArc((52.547958971, 84), (56.083492877, 82.535533906), (57.547958971, 79))
            Line((57.547958971, 79), (57.547958971, 70))
            Line((57.547958971, 70), (63, 70))
        make_face()
    extrude(amount=SWEEP_1_2_DEPTH)

    # 草图15 → 切除-拉伸7 (cut, through all)
    with BuildSketch(Plane.ZY.offset(2)):
        with BuildLine():
            ThreePointArc((43, 10), (40.071067812, 2.928932188), (33, 0))
            Line((33, 0), (43, 0))
            Line((43, 0), (43, 10))
        make_face()
    extrude(amount=-CUT_EXTRUDE_7_DEPTH, mode=Mode.SUBTRACT)

    # 草图16 → 切除-拉伸9 (cut, through all)
    with BuildSketch(Plane.XY.offset(3)):
        with Locations((15.25, 77)):
            Circle(SKETCH_16_R)
        with Locations((47.75, 77)):
            Circle(SKETCH_16_R)
    extrude(amount=-CUT_EXTRUDE_9_DEPTH, mode=Mode.SUBTRACT)

    # 草图21 → 切除-拉伸10 (cut)
    with BuildSketch(Plane.XY.offset(3)):
        with Locations((31.5, 0.75)):
            Rectangle(SKETCH_21_W, SKETCH_21_H)
    extrude(amount=-CUT_EXTRUDE_10_DEPTH, mode=Mode.SUBTRACT)

    # 草图23 → 切除-拉伸11 (cut, up to next)
    with BuildSketch(Plane(origin=(0, 91.452041029, 0), x_dir=(1, 0, 0), z_dir=(0, 1, 0)), mode=Mode.PRIVATE) as cut_extrude_11_sk1:
        with Locations((31.5, -38)):
            Rectangle(SKETCH_23_W, SKETCH_23_H)
    cut_extrude_11_tool1 = extrude(cut_extrude_11_sk1.sketch, amount=-CUT_EXTRUDE_11_REACH, mode=Mode.PRIVATE) & part.part
    add(cut_extrude_11_tool1.solids().sort_by_distance((31.5, 91.452041, 38))[0], mode=Mode.SUBTRACT)


solid = part.part
